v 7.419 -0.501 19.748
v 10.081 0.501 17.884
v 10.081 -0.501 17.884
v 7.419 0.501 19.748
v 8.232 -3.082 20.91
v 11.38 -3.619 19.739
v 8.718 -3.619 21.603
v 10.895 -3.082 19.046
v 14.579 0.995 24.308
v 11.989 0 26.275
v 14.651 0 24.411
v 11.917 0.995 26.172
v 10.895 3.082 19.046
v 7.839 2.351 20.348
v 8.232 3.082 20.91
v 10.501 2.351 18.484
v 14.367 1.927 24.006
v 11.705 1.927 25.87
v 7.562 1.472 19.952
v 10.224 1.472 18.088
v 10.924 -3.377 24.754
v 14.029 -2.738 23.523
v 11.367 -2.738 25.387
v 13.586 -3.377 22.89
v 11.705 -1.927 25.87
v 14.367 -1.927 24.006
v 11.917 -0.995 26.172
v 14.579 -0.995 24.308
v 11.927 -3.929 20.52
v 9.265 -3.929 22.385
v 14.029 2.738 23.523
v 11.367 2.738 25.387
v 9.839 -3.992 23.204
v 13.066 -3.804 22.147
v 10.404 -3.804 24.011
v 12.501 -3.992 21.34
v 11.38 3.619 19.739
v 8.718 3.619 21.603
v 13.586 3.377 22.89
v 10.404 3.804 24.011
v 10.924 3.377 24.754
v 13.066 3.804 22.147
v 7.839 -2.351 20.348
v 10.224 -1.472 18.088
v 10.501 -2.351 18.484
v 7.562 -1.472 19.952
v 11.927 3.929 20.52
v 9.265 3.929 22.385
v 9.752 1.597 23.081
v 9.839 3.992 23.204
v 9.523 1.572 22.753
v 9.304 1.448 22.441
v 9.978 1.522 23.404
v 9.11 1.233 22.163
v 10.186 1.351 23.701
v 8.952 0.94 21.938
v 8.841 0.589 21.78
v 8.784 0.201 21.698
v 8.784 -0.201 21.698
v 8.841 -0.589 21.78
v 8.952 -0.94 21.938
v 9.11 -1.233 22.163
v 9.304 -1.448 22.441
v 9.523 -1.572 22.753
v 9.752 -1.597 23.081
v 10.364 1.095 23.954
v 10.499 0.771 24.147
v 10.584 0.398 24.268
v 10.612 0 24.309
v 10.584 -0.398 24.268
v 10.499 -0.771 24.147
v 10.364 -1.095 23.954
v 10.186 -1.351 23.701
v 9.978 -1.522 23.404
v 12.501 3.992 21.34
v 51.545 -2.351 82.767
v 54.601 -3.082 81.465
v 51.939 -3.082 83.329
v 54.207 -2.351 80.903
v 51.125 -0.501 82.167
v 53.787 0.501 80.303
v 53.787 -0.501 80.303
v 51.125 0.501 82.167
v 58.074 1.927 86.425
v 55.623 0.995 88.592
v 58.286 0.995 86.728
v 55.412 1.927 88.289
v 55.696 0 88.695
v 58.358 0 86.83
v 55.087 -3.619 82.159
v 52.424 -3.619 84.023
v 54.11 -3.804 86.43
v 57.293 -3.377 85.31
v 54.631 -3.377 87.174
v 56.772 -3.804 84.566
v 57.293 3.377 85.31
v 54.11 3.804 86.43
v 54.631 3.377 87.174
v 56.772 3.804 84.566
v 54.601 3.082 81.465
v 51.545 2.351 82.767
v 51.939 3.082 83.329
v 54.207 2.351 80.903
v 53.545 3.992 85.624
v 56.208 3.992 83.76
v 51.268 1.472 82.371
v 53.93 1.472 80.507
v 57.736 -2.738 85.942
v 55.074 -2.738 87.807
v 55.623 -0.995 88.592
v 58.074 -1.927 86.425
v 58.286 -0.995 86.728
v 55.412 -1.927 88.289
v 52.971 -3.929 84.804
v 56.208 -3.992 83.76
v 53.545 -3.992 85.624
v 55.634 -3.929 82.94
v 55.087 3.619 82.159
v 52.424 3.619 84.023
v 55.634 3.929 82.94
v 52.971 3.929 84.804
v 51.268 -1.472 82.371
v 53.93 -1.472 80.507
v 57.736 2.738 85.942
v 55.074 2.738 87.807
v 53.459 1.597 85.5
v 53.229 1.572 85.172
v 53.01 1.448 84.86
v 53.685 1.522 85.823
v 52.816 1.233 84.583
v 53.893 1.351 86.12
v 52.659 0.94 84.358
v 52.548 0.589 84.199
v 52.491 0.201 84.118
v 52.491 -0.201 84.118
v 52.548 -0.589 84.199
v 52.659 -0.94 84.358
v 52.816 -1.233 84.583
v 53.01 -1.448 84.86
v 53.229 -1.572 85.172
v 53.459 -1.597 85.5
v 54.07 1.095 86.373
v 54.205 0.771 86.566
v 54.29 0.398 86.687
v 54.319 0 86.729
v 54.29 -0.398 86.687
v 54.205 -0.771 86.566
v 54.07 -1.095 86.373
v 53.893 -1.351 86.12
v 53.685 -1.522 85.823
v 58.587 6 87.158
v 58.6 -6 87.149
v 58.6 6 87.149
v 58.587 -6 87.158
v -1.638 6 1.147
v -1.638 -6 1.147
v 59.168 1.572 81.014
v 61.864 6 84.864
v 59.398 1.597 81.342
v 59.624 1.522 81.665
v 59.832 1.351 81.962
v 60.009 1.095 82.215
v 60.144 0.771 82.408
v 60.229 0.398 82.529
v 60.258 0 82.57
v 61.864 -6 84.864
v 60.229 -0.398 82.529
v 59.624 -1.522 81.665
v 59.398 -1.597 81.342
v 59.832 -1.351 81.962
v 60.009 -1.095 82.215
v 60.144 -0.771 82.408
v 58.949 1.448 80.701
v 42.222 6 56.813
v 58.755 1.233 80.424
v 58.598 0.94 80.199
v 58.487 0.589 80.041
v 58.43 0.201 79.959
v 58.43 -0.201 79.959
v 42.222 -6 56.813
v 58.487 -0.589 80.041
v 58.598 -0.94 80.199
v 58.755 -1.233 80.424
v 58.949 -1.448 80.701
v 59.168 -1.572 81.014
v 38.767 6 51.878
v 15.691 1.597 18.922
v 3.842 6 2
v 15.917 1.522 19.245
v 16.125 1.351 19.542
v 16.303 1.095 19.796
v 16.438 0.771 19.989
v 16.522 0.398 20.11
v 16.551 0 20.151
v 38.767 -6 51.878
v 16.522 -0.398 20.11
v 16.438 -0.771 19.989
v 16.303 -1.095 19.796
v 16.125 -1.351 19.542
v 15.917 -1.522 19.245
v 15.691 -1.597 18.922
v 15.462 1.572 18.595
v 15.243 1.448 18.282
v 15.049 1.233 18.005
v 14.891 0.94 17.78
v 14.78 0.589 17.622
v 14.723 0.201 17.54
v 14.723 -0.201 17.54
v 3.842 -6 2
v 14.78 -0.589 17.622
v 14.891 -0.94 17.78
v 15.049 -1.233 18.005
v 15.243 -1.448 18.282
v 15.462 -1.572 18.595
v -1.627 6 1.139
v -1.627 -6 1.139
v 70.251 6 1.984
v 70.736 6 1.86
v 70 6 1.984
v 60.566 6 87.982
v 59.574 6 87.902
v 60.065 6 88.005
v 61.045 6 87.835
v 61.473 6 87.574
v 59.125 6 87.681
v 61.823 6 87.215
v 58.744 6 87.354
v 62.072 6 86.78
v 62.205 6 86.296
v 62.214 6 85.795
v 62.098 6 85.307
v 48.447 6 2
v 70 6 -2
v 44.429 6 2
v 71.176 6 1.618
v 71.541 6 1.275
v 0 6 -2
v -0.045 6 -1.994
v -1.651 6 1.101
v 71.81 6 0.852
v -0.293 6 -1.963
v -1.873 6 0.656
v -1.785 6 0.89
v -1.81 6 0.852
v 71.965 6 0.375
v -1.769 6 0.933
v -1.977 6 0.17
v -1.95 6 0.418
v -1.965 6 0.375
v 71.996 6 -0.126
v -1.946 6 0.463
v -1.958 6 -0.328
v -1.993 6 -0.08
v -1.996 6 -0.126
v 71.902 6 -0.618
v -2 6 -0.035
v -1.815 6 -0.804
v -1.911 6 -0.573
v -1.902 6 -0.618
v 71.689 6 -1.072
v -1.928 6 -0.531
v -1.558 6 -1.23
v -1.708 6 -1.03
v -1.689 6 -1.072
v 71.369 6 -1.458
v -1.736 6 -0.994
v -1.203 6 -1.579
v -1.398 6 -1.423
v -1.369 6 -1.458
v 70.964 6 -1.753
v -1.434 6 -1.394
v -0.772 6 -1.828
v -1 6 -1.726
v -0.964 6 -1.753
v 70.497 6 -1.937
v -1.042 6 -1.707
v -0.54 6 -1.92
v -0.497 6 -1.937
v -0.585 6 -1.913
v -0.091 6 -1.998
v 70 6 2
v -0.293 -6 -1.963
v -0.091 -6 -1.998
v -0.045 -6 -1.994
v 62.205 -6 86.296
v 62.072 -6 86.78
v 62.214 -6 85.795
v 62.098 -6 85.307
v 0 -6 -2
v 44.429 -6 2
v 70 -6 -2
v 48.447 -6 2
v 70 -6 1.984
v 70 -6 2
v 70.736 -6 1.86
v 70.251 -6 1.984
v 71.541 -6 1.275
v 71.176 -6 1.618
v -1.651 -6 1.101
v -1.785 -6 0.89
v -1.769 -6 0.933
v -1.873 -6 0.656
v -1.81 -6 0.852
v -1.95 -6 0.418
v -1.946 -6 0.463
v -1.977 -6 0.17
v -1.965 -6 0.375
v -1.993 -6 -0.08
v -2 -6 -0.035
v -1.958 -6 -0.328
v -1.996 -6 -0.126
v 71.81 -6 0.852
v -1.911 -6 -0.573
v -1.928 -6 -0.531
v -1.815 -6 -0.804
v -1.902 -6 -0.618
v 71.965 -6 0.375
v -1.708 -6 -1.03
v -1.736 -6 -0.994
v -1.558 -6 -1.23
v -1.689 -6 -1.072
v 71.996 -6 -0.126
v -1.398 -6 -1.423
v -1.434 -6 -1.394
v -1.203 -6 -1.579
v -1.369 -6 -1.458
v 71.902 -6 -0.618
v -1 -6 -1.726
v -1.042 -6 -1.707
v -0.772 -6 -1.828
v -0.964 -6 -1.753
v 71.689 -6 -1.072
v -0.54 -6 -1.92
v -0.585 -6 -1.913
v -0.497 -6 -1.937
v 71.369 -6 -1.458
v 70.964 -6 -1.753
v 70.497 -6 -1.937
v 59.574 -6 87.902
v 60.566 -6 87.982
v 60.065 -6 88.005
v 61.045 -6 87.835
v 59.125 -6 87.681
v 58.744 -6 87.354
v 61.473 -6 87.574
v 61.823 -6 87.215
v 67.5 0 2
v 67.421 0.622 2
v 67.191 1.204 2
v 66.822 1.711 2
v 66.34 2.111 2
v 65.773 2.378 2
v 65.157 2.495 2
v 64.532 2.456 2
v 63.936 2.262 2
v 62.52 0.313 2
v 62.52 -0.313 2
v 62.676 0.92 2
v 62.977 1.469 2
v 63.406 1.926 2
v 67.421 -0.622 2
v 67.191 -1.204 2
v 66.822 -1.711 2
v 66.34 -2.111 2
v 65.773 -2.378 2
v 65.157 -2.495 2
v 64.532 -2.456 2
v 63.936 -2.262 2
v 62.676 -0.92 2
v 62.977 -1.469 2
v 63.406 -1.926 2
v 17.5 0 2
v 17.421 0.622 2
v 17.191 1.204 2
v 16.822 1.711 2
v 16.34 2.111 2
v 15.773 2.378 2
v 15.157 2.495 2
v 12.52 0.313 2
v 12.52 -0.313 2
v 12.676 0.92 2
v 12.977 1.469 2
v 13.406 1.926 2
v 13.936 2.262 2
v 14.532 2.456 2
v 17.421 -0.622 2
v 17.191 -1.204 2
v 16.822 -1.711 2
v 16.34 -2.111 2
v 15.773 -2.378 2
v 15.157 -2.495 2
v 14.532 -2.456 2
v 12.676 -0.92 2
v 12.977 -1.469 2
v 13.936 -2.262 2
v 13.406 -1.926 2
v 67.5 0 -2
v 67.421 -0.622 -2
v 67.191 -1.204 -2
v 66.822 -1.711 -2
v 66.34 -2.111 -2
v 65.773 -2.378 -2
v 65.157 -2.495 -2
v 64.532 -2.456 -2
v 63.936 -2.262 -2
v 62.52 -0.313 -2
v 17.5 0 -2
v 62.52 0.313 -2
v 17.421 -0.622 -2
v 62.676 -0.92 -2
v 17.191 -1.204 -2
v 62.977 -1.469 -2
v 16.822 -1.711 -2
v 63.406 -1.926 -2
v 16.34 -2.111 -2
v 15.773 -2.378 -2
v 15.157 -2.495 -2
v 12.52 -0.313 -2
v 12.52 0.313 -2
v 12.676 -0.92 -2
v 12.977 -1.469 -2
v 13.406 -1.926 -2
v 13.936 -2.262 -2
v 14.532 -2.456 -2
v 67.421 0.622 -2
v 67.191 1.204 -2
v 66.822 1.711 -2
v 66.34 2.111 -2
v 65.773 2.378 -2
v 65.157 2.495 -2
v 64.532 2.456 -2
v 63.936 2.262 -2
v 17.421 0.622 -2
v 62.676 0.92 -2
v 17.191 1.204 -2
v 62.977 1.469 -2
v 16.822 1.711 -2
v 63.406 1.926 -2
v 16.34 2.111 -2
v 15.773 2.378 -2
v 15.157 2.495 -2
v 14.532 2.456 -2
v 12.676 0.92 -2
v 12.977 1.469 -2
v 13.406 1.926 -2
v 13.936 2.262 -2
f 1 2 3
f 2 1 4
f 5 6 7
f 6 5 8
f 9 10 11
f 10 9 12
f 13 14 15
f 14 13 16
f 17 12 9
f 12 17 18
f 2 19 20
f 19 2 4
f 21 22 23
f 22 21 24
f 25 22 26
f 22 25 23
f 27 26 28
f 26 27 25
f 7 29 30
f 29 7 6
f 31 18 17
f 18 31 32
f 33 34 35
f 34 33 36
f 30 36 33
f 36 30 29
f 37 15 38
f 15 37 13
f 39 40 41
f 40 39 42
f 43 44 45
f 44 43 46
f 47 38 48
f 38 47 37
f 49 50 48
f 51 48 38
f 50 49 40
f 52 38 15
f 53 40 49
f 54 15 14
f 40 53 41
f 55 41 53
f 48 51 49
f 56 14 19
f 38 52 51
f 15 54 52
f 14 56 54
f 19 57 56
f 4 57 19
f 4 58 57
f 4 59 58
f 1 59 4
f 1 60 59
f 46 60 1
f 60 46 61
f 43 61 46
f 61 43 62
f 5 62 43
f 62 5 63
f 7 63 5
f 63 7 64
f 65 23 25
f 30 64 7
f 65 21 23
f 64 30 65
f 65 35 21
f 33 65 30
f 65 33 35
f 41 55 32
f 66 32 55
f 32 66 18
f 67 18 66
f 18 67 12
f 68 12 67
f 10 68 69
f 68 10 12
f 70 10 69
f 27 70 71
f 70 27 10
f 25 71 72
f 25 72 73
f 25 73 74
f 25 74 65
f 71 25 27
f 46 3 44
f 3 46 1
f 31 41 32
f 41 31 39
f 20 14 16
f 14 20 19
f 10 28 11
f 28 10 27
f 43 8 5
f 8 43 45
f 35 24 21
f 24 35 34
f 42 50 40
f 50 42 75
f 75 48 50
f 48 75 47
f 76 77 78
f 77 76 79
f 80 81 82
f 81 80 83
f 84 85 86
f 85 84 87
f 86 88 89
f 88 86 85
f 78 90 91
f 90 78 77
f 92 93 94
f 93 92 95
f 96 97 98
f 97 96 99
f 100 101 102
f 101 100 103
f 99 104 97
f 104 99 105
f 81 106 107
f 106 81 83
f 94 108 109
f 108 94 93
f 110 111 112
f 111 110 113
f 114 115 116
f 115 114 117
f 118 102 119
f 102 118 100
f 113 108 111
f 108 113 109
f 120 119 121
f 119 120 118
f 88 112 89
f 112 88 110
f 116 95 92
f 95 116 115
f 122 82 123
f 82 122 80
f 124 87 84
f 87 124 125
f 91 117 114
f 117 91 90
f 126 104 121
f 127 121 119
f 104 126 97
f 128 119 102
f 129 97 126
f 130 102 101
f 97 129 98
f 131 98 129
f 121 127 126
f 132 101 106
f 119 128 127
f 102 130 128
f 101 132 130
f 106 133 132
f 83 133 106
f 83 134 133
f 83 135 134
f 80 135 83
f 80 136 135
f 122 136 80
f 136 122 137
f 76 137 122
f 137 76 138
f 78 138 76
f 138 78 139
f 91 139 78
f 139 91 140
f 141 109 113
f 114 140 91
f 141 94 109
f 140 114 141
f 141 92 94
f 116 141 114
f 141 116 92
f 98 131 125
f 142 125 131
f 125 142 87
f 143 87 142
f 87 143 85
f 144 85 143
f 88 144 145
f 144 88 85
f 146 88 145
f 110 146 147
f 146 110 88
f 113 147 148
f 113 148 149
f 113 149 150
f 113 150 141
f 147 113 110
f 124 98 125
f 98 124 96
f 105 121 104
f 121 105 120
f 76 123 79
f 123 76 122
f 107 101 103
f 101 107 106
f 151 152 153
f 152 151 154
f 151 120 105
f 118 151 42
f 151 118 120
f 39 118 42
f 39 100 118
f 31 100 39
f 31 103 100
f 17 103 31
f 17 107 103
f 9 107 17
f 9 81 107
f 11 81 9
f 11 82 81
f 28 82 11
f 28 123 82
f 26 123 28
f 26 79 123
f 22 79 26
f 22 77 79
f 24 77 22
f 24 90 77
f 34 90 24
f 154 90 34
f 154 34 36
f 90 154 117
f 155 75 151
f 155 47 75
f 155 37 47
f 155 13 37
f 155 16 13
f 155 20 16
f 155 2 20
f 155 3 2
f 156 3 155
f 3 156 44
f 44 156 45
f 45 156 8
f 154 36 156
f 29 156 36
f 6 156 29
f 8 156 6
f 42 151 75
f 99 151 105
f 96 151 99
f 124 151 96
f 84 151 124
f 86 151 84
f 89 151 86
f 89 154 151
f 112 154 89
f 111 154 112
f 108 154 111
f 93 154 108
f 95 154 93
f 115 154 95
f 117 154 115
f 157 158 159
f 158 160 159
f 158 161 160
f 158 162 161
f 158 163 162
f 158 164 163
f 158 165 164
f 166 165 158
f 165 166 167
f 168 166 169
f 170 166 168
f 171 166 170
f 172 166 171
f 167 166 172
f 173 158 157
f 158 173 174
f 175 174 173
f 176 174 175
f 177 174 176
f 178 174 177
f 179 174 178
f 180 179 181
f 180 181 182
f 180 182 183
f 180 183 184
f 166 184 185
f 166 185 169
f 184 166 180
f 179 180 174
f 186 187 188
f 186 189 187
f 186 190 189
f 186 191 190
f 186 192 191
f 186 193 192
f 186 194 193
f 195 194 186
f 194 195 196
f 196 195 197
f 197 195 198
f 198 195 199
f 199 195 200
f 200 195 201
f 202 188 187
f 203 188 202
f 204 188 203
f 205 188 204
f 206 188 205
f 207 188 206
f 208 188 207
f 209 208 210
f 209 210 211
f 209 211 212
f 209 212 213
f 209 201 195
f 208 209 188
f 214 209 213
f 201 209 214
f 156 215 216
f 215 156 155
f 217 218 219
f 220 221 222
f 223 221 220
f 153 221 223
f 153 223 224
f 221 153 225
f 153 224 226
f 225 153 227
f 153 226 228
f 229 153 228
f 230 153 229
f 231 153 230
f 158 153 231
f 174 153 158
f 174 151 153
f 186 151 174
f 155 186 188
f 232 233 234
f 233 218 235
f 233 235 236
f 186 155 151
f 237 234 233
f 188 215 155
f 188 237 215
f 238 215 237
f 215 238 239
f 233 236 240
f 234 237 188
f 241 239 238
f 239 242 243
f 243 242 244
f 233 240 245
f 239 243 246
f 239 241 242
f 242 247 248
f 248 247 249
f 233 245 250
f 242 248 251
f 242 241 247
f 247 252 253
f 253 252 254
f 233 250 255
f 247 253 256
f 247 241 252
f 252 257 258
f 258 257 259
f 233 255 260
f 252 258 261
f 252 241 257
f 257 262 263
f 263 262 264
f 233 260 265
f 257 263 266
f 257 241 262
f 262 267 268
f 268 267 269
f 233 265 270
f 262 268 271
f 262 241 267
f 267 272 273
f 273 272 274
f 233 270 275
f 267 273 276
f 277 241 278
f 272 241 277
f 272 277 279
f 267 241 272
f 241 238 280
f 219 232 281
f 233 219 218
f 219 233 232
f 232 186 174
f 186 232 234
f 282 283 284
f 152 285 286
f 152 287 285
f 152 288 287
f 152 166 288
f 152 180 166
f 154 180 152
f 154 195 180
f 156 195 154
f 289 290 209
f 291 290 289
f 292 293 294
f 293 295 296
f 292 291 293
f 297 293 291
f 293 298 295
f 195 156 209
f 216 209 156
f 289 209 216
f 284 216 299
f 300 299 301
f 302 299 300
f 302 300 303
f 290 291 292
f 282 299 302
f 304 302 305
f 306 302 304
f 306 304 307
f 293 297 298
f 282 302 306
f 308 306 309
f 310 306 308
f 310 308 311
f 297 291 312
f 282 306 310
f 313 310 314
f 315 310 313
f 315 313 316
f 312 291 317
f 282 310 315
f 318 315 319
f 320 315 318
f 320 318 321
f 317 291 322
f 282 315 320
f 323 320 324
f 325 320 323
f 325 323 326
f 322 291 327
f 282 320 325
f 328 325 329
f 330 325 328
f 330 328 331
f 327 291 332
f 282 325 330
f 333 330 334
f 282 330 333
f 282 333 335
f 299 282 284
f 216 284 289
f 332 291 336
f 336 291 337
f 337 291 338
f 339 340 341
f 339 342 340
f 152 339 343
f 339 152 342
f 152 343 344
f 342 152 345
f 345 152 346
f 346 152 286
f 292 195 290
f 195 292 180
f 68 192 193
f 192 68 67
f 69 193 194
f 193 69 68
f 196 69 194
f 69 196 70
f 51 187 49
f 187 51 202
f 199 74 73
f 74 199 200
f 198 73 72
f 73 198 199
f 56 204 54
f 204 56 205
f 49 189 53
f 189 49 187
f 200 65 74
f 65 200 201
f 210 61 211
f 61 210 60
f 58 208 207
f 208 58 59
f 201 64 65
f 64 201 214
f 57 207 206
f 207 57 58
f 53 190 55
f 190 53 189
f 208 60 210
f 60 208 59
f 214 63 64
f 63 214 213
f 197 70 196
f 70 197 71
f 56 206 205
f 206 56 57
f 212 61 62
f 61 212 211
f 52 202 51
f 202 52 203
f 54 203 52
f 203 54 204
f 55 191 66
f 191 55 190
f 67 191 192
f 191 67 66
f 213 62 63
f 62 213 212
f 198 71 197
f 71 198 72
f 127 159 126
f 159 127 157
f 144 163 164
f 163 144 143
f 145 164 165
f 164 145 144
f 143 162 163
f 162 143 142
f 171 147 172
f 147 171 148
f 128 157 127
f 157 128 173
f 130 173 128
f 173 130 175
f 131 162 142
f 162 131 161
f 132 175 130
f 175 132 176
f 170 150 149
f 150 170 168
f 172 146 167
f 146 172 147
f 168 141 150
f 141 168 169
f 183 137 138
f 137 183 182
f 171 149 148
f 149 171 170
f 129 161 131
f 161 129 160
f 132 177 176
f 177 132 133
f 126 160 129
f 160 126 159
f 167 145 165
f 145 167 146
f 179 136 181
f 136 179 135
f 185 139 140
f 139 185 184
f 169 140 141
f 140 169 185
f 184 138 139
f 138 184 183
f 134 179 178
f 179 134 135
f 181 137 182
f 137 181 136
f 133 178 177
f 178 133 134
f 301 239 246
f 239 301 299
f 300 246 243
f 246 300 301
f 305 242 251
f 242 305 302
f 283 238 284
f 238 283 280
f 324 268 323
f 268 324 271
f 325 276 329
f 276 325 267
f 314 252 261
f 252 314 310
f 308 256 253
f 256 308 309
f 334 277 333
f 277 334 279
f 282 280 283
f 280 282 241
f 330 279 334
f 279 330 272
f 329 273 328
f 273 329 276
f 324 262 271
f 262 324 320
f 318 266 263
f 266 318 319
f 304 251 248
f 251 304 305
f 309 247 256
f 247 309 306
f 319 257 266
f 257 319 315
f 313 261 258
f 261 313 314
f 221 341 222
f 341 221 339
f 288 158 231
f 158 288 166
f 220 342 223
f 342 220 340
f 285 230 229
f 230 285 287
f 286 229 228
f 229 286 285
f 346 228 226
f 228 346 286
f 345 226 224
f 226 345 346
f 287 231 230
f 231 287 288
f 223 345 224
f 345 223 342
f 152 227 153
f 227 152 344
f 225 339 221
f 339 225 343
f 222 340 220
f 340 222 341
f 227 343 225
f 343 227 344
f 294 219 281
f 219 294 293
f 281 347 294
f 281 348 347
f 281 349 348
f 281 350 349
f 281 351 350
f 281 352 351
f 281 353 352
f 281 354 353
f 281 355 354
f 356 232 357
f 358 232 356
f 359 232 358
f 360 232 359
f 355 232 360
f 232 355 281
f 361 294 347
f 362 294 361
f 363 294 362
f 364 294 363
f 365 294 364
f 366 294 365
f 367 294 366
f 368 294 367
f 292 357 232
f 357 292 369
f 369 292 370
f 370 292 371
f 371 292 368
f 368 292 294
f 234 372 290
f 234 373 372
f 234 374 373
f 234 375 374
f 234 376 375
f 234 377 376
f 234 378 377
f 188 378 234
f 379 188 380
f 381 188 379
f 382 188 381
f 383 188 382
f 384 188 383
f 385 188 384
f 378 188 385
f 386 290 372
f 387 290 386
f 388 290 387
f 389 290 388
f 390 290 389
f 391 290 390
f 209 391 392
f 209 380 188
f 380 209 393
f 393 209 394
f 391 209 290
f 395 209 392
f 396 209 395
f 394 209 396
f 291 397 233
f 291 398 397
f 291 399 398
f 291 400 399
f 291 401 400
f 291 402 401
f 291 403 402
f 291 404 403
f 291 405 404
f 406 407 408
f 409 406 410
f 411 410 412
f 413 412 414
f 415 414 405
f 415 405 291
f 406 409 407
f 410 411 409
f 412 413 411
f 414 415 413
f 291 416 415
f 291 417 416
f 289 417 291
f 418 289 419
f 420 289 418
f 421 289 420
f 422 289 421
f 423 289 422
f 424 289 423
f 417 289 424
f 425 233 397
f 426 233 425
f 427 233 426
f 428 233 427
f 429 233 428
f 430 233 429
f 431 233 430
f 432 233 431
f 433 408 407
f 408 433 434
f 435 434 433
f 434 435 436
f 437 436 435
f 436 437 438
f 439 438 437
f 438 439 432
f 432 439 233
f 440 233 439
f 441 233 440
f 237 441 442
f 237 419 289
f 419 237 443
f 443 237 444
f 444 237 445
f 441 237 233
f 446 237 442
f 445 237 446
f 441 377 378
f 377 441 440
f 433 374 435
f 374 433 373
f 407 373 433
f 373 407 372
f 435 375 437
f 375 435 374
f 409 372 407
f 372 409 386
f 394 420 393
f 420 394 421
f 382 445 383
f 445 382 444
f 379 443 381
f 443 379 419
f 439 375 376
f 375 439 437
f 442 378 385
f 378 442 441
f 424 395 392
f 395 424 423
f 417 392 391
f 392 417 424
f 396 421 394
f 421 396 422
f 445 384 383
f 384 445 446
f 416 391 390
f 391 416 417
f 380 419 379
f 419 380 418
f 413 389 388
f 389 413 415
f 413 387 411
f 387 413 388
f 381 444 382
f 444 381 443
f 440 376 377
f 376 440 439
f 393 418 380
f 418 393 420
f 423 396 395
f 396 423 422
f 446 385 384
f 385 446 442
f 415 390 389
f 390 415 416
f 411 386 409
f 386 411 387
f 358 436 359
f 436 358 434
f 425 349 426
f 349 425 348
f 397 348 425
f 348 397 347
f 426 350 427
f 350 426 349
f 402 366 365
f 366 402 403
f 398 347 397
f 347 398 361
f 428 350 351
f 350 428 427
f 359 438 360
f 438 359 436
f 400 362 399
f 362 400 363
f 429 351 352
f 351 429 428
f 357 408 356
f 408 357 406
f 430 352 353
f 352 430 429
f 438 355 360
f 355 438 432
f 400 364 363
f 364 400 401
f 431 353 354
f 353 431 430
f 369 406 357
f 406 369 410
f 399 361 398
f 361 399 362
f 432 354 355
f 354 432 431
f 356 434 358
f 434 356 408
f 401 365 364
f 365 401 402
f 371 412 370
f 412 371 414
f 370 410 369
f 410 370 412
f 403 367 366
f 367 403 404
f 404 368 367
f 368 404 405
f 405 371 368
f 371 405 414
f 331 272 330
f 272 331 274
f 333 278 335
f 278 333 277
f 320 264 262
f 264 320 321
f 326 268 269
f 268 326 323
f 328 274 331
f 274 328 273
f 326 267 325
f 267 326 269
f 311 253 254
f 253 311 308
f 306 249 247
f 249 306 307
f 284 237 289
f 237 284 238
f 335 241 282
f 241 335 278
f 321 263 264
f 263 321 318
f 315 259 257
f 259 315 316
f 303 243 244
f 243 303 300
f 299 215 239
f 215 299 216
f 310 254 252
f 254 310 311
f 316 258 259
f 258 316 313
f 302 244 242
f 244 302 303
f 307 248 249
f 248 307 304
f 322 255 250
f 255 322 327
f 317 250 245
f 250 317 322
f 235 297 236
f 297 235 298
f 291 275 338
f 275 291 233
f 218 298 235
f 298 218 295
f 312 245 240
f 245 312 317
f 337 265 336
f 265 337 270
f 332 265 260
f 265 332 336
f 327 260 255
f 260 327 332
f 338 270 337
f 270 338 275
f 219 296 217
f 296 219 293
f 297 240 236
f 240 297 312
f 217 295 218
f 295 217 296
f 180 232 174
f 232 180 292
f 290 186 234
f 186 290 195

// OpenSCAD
// quality
$fn=25;

// length of PCB side of bracket
pcbLength = 85;

// dimension between mounting holes on PCB
pcbHolesPitch = 76.2;

// diameter of PCB mounting holes
pcbHolesDia = 3.2;

// PCB offset from botom
pcbOffset = 20;

// PCB spacer thickness
pcbDistance = 3.5;

// PCB spacer diameter
pcbDistanceDia = 8;

// angle of PCB (0...right angle, 90...horizontal)
pcbAngle = 35;

// length of clamping side of bracket
bottomLength = 60;

// dimension between mounting holes
bottomHolesPitch = 50;

// mounting holes diameter
bottomHolesDia = 5;

// mounting holes offset
bottomHolesOffset = 10;

// width of holder
width = 12;

// holder thickness
thickness = 4;



module pcbPart() {
  union() {
    difference() {
      union() {
        cube([pcbLength+pcbOffset,width,thickness], center=true);
        if (pcbDistance > 0) {
          translate([-pcbHolesPitch/2+pcbOffset/2,0,pcbDistance]) cylinder (d=pcbDistanceDia, h=pcbDistance, center=true);
          translate([pcbHolesPitch/2+pcbOffset/2,0,pcbDistance]) cylinder (d=pcbDistanceDia, h=pcbDistance, center=true);
        }
      }    
      
      translate([-pcbHolesPitch/2+pcbOffset/2,0,0]) cylinder (d=pcbHolesDia, h=100, center=true);
      translate([pcbHolesPitch/2+pcbOffset/2,0,0]) cylinder (d=pcbHolesDia, h=100, center=true);
    }
    

    translate([-(pcbLength+pcbOffset)/2,0,0])
    rotate([90,90,0])
    cylinder (d=thickness, h=width, center=true);
    
    translate([(pcbLength+pcbOffset)/2,0,0])
    rotate([90,90,0])
    cylinder (d=thickness, h=width, center=true);
  }
}

module bottomPart() {
  union() {
    difference() {
      cube([bottomLength+bottomHolesOffset,width,thickness], center=true);
      translate([-bottomHolesPitch/2+bottomHolesOffset/2,0,0]) cylinder (d=bottomHolesDia, h=100, center=true);
      translate([bottomHolesPitch/2+bottomHolesOffset/2,0,0]) cylinder (d=bottomHolesDia, h=100, center=true);
    }
    
    translate([-(bottomLength+bottomHolesOffset)/2,0,0])
    rotate([90,90,0])
    cylinder (d=thickness, h=width, center=true);

    translate([(bottomLength+bottomHolesOffset)/2,0,0])
    rotate([90,90,0])
    cylinder (d=thickness, h=width, center=true);
  }
}

module reinforcement() {
  hull() {
    translate([(bottomLength+bottomHolesOffset)/1.5,0,0])
    rotate([90,90,0])
    cylinder (d=thickness, h=width, center=true);
    
    rotate([0,-90+pcbAngle,0])
    translate([(pcbLength+pcbOffset)/1.5,0,0])
    rotate([90,90,0])
    cylinder (d=thickness, h=width, center=true);
  }  
}

module holder() {
  union() {
    rotate([0,-90+pcbAngle,0])
    translate([(pcbLength+pcbOffset)/2,0,0])
    pcbPart();

    reinforcement();
    
    translate([(bottomLength+bottomHolesOffset)/2,0,0])
    bottomPart();
  }
}

holder();
